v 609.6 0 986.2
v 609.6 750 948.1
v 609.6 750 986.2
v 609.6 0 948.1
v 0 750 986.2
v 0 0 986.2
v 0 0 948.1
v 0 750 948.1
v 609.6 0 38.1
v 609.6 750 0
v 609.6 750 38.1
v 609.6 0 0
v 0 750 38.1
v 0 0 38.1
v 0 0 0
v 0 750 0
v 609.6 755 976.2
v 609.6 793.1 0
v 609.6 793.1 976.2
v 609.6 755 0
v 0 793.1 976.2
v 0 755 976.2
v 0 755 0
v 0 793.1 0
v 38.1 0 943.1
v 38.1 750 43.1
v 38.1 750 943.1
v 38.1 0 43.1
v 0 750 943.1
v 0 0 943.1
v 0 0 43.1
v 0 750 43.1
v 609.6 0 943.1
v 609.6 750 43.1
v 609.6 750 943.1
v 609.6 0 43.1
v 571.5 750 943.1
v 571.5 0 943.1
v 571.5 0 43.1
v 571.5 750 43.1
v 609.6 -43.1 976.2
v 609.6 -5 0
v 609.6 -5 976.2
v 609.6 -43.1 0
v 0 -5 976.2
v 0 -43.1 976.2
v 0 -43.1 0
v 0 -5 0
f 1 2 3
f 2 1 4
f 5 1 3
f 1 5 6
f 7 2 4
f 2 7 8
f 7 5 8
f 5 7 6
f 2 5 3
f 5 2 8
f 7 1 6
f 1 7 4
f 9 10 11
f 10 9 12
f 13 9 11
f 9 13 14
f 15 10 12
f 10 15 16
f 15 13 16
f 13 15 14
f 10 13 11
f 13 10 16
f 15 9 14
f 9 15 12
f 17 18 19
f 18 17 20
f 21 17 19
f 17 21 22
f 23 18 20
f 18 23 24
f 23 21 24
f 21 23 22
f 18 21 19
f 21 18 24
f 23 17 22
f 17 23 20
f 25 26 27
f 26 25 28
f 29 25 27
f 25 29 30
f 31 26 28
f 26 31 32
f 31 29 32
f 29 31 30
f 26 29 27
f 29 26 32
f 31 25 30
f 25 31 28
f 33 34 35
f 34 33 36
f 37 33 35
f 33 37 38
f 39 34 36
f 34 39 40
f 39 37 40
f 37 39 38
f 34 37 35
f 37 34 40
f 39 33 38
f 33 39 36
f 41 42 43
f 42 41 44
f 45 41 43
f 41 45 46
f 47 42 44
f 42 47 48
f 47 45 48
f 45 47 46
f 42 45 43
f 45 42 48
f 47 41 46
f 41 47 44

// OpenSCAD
// START CR10
// 600mm width  | 24"
// 700mm depth  | 28"
// 900mm tall    | 36"
// END CR10

// START CART
// width 26.5"
// Depth 18"
// Height 24"
// END CART

material_width=(25.4*12*4)/2;// 600;
material_depth=750;
material_height=900;
material_thickness=(25.4*1.5);

vertial_offset=material_thickness+5;

sheet_width=25.4*12*4;
sheet_length=25.4*12*8;

module bottom(){
  cube([material_width, material_depth, material_thickness]);
}

module top(){
  cube([material_width, material_depth, material_thickness]);
}

module back(){
  cube([material_width, material_thickness, material_height+(material_thickness*2)]);
}

module front(){
  cube([material_width, material_thickness, material_height+(material_thickness*2)]);
}


module side(){
  cube([material_thickness, material_depth, material_height]);
}

module blown_assembled(){
  translate([0,0,material_height+vertial_offset+5]) top();
  bottom();
  translate([0,material_depth+5,0]) back();
  translate([0,0, vertial_offset]) side();
  translate([material_width-material_thickness,0, vertial_offset]) side();
  translate([0,-material_thickness-5,0]) front();
}

module sheet(){
  %cube([sheet_width, sheet_length, 1]);
}

module layout(){
  sheet();
  translate([0,0,0])
  projection(cut = true) bottom();
  translate([(25.4*12*4)-material_width,0,0]) projection(cut = true) top();
  
  translate([0,material_depth+1,0]) 
  projection(cut = true) rotate([0,90,0]) side();
  
  
  translate([0,(material_depth+1)*2,0]) 
  projection(cut = true) rotate([0,90,0]) side();
  
  translate([-sheet_width-100,0,0]){
    sheet();
    projection(cut = true) rotate([-90,0,0]) back();
    translate([(25.4*12*4)-material_width,0,0]) 
    projection(cut = true) rotate([-90,0,0]) front();
    
    
    
    // Cart parts
    translate([0,material_height+(material_thickness*2)+5,0]) 
    rotate([0,90,0]) cart_back();
    
    translate([0,(material_height+(material_thickness*2)+(25.4*26.5))+10,0]) 
    rotate([0,90,0]) cart_back();
    
    translate([(25.4*12*2),material_height+(material_thickness*2)+5,0]) 
    rotate([90,0,90]) cart_side();
    
    translate([(25.4*12*2),material_height+(material_thickness*2)+(25.4*18)+10,0]) 
    rotate([90,0,90]) cart_side();
  }
}

module cart_side(){
  cube([(25.4*18), material_thickness, (25.4*24)]);
}

module cart_back(){
  cube([material_thickness, (25.4*26.5), (25.4*24)]);
}

blown_assembled();
//layout();
